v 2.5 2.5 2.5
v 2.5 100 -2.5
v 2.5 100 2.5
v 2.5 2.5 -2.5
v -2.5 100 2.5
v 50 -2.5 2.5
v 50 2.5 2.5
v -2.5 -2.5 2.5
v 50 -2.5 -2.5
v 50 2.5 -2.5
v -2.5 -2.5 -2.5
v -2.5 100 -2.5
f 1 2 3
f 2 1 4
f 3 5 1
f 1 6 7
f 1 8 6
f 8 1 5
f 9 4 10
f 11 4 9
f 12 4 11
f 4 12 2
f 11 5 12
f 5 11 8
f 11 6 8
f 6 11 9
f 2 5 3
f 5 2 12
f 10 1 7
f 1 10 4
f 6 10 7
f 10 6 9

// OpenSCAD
clock();

module clock()
{
    color("black")
    cube([5, 5, 5], center=true);

    color("black")
    translate([0, 50, 0])
    cube([5, 100, 5], center=true);

    color("black")
    rotate([0, 0, -90])
    translate([0, 25, 0])
    cube([5, 50, 5], center=true);
}
